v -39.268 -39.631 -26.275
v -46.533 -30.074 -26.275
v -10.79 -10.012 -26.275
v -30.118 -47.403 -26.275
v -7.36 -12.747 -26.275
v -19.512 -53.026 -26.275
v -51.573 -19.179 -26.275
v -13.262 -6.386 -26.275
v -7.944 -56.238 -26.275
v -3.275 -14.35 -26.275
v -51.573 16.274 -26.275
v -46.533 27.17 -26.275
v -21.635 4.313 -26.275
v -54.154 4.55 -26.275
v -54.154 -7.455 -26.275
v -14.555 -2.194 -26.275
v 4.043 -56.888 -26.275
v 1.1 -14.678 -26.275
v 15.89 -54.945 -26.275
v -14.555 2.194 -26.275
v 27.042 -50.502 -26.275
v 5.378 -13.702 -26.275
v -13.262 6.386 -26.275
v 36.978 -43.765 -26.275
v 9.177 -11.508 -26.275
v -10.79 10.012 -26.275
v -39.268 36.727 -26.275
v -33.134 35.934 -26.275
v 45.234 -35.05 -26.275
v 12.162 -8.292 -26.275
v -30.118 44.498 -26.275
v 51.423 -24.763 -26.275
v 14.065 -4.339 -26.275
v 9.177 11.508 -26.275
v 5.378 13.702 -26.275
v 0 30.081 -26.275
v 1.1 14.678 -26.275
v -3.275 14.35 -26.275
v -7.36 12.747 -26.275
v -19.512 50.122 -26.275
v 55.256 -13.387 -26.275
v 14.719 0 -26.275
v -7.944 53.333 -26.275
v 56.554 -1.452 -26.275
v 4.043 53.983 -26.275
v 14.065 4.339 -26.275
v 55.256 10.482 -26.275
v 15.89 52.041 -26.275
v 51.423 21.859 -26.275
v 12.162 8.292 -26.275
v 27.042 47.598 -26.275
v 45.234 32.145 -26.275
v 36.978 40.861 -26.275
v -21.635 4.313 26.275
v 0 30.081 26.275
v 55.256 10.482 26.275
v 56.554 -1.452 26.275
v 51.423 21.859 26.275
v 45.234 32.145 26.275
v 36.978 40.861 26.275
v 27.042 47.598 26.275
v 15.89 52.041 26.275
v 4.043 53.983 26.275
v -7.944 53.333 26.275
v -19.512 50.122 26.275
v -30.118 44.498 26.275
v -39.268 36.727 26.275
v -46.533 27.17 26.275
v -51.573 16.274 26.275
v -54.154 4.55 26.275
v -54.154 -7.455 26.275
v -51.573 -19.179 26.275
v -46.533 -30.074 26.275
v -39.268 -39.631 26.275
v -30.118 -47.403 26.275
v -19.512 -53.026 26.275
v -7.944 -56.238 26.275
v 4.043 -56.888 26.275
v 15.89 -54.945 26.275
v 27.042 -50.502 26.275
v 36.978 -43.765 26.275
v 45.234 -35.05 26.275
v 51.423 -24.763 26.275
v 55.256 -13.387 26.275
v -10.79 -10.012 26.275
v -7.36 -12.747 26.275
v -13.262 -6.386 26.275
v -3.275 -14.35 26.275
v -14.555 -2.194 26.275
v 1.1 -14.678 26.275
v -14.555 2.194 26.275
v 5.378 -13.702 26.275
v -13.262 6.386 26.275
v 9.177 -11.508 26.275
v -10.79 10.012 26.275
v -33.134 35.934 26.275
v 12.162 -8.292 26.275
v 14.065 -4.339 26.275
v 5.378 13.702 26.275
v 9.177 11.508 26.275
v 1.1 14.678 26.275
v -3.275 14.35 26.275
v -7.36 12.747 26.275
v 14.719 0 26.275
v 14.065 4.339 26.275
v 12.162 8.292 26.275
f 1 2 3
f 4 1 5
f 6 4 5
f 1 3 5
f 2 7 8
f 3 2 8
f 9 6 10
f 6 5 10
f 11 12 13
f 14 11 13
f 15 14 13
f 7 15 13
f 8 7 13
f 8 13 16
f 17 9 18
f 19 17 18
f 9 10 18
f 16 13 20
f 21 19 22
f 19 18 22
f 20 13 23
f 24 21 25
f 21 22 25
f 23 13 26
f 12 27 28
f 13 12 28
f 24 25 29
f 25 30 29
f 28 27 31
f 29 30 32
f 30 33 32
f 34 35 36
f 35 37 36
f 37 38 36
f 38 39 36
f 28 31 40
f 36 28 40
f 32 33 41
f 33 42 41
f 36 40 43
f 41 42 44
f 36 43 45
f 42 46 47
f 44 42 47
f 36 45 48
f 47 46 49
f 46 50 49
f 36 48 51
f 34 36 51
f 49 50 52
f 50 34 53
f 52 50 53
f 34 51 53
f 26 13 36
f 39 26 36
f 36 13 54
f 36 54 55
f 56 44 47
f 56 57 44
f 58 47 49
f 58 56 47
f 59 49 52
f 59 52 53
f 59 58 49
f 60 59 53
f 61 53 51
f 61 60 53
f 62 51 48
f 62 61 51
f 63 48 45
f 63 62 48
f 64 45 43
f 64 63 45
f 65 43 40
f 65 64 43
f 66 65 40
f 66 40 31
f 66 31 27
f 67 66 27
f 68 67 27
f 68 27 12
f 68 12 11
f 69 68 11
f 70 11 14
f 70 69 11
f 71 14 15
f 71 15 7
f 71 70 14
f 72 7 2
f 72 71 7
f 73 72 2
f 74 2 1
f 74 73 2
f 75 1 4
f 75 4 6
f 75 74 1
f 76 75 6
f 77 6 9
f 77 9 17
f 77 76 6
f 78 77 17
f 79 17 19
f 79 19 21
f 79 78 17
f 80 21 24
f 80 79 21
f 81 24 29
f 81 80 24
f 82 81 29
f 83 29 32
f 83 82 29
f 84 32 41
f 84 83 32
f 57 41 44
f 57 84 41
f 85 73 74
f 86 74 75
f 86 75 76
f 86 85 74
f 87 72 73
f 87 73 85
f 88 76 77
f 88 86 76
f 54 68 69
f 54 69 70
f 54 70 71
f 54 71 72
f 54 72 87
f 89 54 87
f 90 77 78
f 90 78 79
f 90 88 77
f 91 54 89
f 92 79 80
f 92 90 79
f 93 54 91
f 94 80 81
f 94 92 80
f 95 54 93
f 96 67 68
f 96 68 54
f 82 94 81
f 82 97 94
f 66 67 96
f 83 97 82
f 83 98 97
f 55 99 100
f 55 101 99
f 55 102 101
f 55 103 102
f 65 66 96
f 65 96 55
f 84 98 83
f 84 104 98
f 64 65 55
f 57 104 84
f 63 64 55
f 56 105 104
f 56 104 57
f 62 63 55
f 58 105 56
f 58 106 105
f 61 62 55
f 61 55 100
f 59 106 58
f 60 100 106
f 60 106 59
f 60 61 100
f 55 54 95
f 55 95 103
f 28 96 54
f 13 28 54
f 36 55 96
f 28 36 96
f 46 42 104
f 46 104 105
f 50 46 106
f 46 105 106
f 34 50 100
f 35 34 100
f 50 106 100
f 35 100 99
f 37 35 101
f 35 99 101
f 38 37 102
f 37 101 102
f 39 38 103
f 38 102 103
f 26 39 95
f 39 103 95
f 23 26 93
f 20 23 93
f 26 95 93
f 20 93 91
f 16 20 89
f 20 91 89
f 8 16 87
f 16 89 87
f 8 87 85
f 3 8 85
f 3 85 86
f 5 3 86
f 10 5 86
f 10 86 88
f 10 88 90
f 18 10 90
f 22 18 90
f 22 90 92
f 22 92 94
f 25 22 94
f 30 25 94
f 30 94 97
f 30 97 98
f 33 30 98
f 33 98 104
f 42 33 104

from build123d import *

# Parameters (mm, degrees)
F0_R     = 55.5167866595
F1_DEPTH = 26.2752361596
F3_DEPTH = 74.1270780563
F4_R     = 14.7193
F5_DEPTH = 121.8407154083


with BuildPart() as f1:
    # F0 (on Top) → F1 (new body, symmetric)
    with BuildSketch(Plane.XY):
        with Locations((1.0372549295, -1.4521926641)):
            Circle(F0_R)
    extrude(amount=F1_DEPTH, both=True)

    # F2 (on face) → F3 (cut)
    with BuildSketch(Plane.XY.offset(26.2752361596)):
        Polygon((-21.6351760827, 4.3129721936), (0, 30.081294477), (-33.1336097517, 35.9337454382), align=None)
    extrude(amount=-F3_DEPTH, mode=Mode.SUBTRACT)

    # F4 (on face) → F5 (cut)
    with BuildSketch(Plane.XY.offset(26.2752361596)):
        Circle(F4_R)
    extrude(amount=-F5_DEPTH, mode=Mode.SUBTRACT)


solid = f1.part
